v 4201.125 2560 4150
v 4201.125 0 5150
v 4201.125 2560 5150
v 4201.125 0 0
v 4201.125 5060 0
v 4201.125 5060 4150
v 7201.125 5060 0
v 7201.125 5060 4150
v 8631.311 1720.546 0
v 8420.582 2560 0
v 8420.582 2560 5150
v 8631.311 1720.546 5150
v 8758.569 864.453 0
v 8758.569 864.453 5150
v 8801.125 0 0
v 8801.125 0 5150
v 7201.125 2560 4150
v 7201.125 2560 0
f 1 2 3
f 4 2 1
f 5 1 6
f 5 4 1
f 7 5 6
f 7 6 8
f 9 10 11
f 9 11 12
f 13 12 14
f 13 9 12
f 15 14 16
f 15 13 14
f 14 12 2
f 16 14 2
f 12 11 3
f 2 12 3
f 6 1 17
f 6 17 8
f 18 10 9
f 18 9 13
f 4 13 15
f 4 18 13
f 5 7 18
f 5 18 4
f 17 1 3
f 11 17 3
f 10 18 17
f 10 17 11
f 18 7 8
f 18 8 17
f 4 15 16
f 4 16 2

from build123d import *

# Parameters (mm, degrees)
EXTRUDE_1_DEPTH     = 5150
SKETCH_3_W          = 1000
SKETCH_3_H          = 2500
CUT_EXTRUDE_1_DEPTH = 8561.73010905


with BuildPart() as part:
    # Эскиз2 → Бобышка-Вытянуть1 (new body)
    with BuildSketch(Plane.XY):
        with BuildLine():
            Line((4201.125, 5060), (7201.125, 5060))
            Line((7201.125, 5060), (7201.125, 2560))
            Line((7201.125, 2560), (8420.582002785, 2560))
            ThreePointArc((8420.582002785, 2560), (8705.469431481, 1294.064620945), (8801.125, 0))
            Line((8801.125, 0), (4201.125, 0))
            Line((4201.125, 0), (4201.125, 5060))
        make_face()
    extrude(amount=EXTRUDE_1_DEPTH)

    # Эскиз3 → Вырез-Вытянуть1 (cut, through all)
    with BuildSketch(Plane.ZY.offset(-4201.125)):
        with Locations((4650, 3810)):
            Rectangle(SKETCH_3_W, SKETCH_3_H)
    extrude(amount=-CUT_EXTRUDE_1_DEPTH, mode=Mode.SUBTRACT)


solid = part.part
